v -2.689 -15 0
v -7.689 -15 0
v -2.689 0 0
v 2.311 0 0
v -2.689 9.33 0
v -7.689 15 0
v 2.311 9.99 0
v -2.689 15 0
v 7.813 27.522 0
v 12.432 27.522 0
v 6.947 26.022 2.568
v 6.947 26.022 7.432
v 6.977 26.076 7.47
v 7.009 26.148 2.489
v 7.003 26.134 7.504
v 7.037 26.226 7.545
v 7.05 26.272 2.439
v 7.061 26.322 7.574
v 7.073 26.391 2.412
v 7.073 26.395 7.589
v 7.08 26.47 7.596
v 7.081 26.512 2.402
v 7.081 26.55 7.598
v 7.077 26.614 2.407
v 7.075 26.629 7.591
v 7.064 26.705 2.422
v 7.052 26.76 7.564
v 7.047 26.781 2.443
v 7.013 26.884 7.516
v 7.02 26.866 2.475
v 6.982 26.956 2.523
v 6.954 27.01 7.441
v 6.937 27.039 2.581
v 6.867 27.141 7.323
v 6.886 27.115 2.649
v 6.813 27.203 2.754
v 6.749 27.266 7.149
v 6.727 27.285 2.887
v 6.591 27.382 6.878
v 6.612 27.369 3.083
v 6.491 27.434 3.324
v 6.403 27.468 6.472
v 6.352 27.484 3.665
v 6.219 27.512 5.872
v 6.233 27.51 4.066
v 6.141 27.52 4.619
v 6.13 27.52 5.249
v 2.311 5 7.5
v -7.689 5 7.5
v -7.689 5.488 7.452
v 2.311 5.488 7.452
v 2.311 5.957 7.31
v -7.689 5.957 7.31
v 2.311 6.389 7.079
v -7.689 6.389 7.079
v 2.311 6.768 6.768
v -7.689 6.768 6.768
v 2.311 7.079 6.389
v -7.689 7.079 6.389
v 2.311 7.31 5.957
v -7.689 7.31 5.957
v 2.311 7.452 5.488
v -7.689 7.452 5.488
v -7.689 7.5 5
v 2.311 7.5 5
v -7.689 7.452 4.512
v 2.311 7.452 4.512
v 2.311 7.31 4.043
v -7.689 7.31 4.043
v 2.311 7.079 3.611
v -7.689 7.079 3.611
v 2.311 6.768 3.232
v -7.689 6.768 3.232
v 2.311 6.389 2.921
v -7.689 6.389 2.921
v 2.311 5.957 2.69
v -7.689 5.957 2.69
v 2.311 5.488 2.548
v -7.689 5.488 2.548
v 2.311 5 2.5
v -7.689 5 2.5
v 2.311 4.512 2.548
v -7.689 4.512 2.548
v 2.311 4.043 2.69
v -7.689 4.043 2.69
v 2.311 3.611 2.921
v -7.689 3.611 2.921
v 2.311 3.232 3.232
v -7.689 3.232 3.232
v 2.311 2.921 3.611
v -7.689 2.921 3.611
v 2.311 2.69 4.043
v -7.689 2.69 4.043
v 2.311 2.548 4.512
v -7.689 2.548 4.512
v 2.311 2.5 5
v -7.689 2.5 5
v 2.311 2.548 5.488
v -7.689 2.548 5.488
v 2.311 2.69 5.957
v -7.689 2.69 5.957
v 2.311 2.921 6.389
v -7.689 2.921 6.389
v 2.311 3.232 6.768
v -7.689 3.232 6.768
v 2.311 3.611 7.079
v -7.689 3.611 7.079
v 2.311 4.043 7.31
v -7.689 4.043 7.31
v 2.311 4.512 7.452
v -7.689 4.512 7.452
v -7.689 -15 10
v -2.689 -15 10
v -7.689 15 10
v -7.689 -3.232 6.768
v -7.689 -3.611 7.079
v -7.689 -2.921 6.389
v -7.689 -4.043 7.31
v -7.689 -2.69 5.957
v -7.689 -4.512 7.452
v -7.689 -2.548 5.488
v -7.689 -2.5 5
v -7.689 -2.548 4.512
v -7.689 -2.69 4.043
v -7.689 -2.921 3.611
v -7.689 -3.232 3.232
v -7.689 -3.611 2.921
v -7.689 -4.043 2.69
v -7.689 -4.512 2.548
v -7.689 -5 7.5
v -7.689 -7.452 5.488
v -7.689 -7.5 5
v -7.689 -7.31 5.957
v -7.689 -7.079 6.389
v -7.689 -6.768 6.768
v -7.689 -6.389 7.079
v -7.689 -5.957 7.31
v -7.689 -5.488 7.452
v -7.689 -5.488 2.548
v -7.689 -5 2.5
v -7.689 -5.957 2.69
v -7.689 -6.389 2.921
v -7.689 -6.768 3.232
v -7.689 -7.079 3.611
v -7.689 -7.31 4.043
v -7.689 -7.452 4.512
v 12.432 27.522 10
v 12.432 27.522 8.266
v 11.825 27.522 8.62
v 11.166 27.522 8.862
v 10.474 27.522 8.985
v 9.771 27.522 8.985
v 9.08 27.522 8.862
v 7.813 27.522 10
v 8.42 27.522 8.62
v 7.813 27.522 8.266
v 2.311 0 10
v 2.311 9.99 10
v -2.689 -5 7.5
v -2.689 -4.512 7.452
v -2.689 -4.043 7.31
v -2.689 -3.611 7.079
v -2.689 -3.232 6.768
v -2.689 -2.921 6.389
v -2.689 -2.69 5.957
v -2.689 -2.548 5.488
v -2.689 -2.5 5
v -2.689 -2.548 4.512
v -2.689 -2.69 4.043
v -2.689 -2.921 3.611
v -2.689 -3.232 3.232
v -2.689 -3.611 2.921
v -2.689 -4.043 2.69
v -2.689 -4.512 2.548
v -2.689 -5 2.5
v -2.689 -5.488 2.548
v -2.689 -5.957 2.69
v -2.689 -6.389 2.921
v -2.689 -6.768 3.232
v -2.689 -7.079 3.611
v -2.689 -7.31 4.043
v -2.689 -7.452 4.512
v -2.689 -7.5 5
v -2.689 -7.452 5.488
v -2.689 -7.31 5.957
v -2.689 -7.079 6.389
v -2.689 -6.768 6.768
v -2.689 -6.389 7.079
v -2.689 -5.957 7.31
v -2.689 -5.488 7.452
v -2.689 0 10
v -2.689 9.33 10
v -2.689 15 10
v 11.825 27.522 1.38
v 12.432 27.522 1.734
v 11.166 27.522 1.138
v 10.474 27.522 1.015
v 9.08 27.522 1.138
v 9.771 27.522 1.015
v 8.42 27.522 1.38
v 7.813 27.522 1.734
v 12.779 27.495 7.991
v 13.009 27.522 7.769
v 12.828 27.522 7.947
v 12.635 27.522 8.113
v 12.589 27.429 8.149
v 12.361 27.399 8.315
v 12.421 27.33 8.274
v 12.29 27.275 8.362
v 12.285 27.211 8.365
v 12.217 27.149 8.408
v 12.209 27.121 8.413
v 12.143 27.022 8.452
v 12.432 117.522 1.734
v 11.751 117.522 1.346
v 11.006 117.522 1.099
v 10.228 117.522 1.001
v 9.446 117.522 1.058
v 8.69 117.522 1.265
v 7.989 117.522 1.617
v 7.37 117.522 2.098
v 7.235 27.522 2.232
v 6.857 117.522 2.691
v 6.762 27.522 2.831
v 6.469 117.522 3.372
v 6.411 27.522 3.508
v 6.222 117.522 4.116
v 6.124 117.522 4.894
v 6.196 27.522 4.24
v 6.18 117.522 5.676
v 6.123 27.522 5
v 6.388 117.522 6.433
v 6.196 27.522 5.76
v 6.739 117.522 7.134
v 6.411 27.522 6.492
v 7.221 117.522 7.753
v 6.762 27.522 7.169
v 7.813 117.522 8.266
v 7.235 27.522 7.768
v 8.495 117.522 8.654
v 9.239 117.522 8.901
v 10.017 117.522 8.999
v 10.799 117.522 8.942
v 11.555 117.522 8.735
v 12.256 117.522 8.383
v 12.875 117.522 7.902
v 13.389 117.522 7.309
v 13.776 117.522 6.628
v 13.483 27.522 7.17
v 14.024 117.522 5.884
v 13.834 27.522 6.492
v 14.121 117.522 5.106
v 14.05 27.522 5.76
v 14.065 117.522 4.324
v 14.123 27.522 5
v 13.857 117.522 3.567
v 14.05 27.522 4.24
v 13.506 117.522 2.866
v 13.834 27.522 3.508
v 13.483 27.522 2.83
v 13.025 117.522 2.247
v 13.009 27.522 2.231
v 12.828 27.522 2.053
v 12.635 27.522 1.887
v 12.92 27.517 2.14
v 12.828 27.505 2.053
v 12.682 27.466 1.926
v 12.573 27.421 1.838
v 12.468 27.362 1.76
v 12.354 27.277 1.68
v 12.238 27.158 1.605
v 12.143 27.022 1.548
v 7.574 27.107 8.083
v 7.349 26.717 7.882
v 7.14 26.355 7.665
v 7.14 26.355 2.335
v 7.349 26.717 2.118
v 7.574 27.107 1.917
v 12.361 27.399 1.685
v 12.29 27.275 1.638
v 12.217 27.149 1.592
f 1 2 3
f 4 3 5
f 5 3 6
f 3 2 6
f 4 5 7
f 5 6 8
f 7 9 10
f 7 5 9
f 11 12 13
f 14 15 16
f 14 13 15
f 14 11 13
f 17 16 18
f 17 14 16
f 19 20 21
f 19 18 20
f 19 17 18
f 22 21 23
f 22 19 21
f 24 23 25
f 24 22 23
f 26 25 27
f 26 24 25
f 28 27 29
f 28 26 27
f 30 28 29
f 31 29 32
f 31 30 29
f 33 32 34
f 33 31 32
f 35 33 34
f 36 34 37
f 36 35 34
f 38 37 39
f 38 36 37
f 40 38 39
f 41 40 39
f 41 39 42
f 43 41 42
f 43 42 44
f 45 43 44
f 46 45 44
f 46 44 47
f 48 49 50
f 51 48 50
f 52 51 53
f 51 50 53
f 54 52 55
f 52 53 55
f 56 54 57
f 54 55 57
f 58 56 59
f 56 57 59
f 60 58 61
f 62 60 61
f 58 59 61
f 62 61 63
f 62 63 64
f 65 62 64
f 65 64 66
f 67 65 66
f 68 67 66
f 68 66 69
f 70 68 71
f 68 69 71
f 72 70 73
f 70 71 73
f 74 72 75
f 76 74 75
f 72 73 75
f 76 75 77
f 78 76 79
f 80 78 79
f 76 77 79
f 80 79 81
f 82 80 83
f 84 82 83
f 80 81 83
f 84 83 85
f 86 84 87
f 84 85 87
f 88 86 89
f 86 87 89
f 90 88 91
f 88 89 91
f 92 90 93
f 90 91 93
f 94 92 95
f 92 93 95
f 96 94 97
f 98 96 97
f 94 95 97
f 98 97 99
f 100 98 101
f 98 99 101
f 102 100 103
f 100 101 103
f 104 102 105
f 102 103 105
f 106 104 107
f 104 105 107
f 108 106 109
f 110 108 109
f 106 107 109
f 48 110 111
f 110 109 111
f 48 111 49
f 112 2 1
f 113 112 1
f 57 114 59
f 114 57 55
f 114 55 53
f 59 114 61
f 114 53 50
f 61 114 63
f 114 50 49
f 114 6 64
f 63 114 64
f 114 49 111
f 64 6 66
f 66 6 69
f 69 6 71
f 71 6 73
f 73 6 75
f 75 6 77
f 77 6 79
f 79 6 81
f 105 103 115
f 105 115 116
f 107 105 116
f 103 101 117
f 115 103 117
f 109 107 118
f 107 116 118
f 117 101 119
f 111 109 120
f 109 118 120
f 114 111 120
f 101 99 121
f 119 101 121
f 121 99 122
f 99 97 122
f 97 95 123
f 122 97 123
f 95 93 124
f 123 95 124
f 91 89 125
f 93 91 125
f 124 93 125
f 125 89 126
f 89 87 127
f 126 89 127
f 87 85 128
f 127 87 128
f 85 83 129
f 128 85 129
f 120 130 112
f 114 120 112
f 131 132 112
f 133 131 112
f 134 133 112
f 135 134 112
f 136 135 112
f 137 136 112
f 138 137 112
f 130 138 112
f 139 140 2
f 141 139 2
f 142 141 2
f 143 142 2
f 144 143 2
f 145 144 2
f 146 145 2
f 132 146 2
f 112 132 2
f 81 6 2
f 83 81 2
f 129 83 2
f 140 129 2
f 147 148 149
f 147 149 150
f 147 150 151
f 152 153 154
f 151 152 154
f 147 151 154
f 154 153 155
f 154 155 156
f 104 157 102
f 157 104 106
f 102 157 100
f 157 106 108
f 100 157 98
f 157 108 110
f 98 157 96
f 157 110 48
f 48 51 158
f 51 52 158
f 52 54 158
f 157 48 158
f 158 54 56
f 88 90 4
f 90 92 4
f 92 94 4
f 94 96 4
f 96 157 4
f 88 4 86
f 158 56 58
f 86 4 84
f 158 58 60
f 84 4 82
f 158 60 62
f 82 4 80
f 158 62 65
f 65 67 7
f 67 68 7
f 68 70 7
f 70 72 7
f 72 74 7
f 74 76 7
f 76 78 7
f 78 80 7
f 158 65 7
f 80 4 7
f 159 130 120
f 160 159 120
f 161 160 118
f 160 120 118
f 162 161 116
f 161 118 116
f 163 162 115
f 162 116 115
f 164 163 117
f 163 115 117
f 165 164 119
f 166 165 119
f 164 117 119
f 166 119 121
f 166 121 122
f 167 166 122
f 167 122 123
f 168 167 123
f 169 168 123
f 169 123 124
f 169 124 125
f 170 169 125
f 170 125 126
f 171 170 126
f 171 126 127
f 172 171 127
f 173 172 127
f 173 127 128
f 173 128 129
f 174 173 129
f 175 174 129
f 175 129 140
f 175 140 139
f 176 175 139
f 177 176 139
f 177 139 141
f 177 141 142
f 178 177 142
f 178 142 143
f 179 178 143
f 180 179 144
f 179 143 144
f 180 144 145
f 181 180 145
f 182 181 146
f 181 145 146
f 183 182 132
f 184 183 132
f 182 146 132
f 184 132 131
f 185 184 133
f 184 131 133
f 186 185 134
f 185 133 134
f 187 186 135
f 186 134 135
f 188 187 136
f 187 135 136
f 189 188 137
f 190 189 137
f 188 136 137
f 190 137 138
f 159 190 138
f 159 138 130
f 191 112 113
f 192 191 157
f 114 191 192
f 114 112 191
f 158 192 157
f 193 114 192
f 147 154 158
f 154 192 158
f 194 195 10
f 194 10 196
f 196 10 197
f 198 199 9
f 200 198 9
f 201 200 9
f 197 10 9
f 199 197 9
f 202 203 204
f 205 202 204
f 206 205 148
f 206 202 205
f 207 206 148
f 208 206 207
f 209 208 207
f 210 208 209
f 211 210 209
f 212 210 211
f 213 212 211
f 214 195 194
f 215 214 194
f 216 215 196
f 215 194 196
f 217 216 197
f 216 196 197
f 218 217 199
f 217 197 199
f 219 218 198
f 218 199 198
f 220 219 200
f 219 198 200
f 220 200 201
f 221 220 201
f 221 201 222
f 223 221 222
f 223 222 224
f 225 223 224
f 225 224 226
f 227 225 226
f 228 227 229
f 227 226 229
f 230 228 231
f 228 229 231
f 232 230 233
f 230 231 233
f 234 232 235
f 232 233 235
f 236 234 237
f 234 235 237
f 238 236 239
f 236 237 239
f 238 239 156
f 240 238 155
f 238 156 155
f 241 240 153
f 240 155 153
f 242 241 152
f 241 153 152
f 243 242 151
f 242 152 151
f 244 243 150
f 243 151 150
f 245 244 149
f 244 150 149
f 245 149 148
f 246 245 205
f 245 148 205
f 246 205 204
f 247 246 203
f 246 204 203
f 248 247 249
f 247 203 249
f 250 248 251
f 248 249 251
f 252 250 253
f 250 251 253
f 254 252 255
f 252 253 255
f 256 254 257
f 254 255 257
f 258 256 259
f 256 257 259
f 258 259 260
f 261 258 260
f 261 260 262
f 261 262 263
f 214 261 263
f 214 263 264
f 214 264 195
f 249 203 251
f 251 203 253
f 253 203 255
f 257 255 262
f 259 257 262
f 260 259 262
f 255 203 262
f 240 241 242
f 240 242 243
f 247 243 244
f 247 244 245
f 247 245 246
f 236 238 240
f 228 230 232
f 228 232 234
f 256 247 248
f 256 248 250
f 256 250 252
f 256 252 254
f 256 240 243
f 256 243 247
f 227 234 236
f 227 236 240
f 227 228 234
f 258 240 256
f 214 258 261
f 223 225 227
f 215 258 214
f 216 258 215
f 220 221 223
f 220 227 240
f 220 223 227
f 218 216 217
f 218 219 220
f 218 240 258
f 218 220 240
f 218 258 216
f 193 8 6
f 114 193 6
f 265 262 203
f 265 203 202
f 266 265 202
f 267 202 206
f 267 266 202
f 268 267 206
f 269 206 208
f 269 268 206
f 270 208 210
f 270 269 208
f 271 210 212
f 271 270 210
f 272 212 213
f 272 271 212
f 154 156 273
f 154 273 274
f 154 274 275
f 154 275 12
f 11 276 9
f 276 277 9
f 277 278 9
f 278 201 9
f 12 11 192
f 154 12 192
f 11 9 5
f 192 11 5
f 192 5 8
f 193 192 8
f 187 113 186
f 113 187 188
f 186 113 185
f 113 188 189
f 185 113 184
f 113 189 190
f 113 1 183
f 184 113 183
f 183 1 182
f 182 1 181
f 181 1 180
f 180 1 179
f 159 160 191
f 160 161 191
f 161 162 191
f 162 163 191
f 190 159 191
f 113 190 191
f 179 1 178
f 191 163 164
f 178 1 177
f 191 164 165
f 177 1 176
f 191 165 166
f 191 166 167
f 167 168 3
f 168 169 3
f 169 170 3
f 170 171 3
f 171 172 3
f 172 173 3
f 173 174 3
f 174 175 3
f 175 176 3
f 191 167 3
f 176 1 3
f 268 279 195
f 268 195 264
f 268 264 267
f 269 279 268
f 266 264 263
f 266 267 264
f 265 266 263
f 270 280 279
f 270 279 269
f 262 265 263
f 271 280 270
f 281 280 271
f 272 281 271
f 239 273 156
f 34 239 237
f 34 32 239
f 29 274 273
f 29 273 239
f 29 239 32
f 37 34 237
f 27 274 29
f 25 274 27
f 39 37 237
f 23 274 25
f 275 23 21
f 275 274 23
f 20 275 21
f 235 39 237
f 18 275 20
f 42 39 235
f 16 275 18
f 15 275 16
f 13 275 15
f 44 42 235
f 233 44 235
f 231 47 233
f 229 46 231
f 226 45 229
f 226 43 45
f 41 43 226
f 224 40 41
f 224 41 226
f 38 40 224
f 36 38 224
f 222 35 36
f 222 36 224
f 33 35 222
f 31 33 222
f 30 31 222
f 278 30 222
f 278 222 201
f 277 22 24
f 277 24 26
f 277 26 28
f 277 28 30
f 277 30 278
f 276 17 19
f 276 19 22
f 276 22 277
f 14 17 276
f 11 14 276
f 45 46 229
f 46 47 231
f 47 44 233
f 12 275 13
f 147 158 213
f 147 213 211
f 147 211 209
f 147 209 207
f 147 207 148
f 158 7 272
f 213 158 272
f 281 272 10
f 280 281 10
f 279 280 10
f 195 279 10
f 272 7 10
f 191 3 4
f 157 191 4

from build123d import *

# Parameters (mm, degrees)
BASE_DEPTH      = 10
ESQUISSE3_R     = 2.5
VIDE_TROU_DEPTH = 10
ESQUISSE4_R     = 4
AXE_DEPTH       = 90
CONG_5_R        = 1


with BuildPart() as part:
    # Esquisse2 → BASE (new body)
    with BuildSketch(Plane.XY):
        Polygon((-7.689490084, -15), (-2.689490084, -15), (-2.689490084, 0), (2.310509916, 0), (2.310509916, 9.990381057), (12.432116189, 27.521517376), (7.813314036, 27.521517376), (-2.689490084, 9.330127019), (-2.689490084, 15), (-7.689490084, 15), align=None)
    extrude(amount=BASE_DEPTH)

    # Esquisse3 → VIDE TROU (cut)
    with BuildSketch(Plane.ZY.offset(7.689490084)):
        with Locations((5, 5)):
            Circle(ESQUISSE3_R)
        with Locations((5, -5)):
            Circle(ESQUISSE3_R)
    extrude(amount=-VIDE_TROU_DEPTH, mode=Mode.SUBTRACT)

    # Esquisse4 → AXE (add)
    with BuildSketch(Plane(origin=(0, 27.521517376, 0), x_dir=(1, 0, 0), z_dir=(0, 1, 0))):
        with Locations(Location((10.122715113, -5, 0), (0, 0, 54.735610317))):
            Circle(ESQUISSE4_R)
    extrude(amount=AXE_DEPTH)

    # Congé5
    # the kernel refuses this fillet: 1 mm, written as the material it adds along each edge
    with BuildSketch(Plane(origin=(7.813314036, 27.521517376, -2.596113343), x_dir=(-0.500000000000004, -0.8660254037844363, 0), z_dir=(0, 0, 1))) as cong_5_piece_1_section:
        with BuildLine():
            CenterArc((CONG_5_R * 1.73205080757, -CONG_5_R), CONG_5_R, 90, 120)
            Line((CONG_5_R * 0.866025403784, -CONG_5_R * 1.5), (0, 0))
            Line((0, 0), (CONG_5_R * 1.73205080757, 0))
        make_face()
    cong_5_piece_1 = extrude(amount=15.192226685, mode=Mode.PRIVATE)
    cong_5_piece_1 = cong_5_piece_1 & Plane(origin=(10.122715113, 27.147514767, 5), x_dir=(0.577350269193122, 0, -0.8164965809252538), z_dir=(0, -1, 0)) * Cylinder(4, 38, mode=Mode.PRIVATE)
    add(cong_5_piece_1)
    with BuildSketch(Plane(origin=(12.432116189, 27.521517376, 0.290638003), x_dir=(-0.500000000000006, -0.8660254037844353, 0), z_dir=(0, 0, 1))) as cong_5_piece_2_section:
        with BuildLine():
            CenterArc((CONG_5_R * 0.57735026919, CONG_5_R), CONG_5_R, 210, 60)
            Line((-CONG_5_R * 0.288675134595, CONG_5_R * 0.5), (0, 0))
            Line((0, 0), (CONG_5_R * 0.57735026919, 0))
        make_face()
    cong_5_piece_2 = extrude(amount=9.418723993, mode=Mode.PRIVATE)
    cong_5_piece_2 = cong_5_piece_2 & Plane(origin=(10.122715113, 27.414246349, 5), x_dir=(0.577350269193122, 0, -0.8164965809252538), z_dir=(0, -1, 0)) * Cylinder(4, 22, mode=Mode.PRIVATE)
    add(cong_5_piece_2)


solid = part.part
